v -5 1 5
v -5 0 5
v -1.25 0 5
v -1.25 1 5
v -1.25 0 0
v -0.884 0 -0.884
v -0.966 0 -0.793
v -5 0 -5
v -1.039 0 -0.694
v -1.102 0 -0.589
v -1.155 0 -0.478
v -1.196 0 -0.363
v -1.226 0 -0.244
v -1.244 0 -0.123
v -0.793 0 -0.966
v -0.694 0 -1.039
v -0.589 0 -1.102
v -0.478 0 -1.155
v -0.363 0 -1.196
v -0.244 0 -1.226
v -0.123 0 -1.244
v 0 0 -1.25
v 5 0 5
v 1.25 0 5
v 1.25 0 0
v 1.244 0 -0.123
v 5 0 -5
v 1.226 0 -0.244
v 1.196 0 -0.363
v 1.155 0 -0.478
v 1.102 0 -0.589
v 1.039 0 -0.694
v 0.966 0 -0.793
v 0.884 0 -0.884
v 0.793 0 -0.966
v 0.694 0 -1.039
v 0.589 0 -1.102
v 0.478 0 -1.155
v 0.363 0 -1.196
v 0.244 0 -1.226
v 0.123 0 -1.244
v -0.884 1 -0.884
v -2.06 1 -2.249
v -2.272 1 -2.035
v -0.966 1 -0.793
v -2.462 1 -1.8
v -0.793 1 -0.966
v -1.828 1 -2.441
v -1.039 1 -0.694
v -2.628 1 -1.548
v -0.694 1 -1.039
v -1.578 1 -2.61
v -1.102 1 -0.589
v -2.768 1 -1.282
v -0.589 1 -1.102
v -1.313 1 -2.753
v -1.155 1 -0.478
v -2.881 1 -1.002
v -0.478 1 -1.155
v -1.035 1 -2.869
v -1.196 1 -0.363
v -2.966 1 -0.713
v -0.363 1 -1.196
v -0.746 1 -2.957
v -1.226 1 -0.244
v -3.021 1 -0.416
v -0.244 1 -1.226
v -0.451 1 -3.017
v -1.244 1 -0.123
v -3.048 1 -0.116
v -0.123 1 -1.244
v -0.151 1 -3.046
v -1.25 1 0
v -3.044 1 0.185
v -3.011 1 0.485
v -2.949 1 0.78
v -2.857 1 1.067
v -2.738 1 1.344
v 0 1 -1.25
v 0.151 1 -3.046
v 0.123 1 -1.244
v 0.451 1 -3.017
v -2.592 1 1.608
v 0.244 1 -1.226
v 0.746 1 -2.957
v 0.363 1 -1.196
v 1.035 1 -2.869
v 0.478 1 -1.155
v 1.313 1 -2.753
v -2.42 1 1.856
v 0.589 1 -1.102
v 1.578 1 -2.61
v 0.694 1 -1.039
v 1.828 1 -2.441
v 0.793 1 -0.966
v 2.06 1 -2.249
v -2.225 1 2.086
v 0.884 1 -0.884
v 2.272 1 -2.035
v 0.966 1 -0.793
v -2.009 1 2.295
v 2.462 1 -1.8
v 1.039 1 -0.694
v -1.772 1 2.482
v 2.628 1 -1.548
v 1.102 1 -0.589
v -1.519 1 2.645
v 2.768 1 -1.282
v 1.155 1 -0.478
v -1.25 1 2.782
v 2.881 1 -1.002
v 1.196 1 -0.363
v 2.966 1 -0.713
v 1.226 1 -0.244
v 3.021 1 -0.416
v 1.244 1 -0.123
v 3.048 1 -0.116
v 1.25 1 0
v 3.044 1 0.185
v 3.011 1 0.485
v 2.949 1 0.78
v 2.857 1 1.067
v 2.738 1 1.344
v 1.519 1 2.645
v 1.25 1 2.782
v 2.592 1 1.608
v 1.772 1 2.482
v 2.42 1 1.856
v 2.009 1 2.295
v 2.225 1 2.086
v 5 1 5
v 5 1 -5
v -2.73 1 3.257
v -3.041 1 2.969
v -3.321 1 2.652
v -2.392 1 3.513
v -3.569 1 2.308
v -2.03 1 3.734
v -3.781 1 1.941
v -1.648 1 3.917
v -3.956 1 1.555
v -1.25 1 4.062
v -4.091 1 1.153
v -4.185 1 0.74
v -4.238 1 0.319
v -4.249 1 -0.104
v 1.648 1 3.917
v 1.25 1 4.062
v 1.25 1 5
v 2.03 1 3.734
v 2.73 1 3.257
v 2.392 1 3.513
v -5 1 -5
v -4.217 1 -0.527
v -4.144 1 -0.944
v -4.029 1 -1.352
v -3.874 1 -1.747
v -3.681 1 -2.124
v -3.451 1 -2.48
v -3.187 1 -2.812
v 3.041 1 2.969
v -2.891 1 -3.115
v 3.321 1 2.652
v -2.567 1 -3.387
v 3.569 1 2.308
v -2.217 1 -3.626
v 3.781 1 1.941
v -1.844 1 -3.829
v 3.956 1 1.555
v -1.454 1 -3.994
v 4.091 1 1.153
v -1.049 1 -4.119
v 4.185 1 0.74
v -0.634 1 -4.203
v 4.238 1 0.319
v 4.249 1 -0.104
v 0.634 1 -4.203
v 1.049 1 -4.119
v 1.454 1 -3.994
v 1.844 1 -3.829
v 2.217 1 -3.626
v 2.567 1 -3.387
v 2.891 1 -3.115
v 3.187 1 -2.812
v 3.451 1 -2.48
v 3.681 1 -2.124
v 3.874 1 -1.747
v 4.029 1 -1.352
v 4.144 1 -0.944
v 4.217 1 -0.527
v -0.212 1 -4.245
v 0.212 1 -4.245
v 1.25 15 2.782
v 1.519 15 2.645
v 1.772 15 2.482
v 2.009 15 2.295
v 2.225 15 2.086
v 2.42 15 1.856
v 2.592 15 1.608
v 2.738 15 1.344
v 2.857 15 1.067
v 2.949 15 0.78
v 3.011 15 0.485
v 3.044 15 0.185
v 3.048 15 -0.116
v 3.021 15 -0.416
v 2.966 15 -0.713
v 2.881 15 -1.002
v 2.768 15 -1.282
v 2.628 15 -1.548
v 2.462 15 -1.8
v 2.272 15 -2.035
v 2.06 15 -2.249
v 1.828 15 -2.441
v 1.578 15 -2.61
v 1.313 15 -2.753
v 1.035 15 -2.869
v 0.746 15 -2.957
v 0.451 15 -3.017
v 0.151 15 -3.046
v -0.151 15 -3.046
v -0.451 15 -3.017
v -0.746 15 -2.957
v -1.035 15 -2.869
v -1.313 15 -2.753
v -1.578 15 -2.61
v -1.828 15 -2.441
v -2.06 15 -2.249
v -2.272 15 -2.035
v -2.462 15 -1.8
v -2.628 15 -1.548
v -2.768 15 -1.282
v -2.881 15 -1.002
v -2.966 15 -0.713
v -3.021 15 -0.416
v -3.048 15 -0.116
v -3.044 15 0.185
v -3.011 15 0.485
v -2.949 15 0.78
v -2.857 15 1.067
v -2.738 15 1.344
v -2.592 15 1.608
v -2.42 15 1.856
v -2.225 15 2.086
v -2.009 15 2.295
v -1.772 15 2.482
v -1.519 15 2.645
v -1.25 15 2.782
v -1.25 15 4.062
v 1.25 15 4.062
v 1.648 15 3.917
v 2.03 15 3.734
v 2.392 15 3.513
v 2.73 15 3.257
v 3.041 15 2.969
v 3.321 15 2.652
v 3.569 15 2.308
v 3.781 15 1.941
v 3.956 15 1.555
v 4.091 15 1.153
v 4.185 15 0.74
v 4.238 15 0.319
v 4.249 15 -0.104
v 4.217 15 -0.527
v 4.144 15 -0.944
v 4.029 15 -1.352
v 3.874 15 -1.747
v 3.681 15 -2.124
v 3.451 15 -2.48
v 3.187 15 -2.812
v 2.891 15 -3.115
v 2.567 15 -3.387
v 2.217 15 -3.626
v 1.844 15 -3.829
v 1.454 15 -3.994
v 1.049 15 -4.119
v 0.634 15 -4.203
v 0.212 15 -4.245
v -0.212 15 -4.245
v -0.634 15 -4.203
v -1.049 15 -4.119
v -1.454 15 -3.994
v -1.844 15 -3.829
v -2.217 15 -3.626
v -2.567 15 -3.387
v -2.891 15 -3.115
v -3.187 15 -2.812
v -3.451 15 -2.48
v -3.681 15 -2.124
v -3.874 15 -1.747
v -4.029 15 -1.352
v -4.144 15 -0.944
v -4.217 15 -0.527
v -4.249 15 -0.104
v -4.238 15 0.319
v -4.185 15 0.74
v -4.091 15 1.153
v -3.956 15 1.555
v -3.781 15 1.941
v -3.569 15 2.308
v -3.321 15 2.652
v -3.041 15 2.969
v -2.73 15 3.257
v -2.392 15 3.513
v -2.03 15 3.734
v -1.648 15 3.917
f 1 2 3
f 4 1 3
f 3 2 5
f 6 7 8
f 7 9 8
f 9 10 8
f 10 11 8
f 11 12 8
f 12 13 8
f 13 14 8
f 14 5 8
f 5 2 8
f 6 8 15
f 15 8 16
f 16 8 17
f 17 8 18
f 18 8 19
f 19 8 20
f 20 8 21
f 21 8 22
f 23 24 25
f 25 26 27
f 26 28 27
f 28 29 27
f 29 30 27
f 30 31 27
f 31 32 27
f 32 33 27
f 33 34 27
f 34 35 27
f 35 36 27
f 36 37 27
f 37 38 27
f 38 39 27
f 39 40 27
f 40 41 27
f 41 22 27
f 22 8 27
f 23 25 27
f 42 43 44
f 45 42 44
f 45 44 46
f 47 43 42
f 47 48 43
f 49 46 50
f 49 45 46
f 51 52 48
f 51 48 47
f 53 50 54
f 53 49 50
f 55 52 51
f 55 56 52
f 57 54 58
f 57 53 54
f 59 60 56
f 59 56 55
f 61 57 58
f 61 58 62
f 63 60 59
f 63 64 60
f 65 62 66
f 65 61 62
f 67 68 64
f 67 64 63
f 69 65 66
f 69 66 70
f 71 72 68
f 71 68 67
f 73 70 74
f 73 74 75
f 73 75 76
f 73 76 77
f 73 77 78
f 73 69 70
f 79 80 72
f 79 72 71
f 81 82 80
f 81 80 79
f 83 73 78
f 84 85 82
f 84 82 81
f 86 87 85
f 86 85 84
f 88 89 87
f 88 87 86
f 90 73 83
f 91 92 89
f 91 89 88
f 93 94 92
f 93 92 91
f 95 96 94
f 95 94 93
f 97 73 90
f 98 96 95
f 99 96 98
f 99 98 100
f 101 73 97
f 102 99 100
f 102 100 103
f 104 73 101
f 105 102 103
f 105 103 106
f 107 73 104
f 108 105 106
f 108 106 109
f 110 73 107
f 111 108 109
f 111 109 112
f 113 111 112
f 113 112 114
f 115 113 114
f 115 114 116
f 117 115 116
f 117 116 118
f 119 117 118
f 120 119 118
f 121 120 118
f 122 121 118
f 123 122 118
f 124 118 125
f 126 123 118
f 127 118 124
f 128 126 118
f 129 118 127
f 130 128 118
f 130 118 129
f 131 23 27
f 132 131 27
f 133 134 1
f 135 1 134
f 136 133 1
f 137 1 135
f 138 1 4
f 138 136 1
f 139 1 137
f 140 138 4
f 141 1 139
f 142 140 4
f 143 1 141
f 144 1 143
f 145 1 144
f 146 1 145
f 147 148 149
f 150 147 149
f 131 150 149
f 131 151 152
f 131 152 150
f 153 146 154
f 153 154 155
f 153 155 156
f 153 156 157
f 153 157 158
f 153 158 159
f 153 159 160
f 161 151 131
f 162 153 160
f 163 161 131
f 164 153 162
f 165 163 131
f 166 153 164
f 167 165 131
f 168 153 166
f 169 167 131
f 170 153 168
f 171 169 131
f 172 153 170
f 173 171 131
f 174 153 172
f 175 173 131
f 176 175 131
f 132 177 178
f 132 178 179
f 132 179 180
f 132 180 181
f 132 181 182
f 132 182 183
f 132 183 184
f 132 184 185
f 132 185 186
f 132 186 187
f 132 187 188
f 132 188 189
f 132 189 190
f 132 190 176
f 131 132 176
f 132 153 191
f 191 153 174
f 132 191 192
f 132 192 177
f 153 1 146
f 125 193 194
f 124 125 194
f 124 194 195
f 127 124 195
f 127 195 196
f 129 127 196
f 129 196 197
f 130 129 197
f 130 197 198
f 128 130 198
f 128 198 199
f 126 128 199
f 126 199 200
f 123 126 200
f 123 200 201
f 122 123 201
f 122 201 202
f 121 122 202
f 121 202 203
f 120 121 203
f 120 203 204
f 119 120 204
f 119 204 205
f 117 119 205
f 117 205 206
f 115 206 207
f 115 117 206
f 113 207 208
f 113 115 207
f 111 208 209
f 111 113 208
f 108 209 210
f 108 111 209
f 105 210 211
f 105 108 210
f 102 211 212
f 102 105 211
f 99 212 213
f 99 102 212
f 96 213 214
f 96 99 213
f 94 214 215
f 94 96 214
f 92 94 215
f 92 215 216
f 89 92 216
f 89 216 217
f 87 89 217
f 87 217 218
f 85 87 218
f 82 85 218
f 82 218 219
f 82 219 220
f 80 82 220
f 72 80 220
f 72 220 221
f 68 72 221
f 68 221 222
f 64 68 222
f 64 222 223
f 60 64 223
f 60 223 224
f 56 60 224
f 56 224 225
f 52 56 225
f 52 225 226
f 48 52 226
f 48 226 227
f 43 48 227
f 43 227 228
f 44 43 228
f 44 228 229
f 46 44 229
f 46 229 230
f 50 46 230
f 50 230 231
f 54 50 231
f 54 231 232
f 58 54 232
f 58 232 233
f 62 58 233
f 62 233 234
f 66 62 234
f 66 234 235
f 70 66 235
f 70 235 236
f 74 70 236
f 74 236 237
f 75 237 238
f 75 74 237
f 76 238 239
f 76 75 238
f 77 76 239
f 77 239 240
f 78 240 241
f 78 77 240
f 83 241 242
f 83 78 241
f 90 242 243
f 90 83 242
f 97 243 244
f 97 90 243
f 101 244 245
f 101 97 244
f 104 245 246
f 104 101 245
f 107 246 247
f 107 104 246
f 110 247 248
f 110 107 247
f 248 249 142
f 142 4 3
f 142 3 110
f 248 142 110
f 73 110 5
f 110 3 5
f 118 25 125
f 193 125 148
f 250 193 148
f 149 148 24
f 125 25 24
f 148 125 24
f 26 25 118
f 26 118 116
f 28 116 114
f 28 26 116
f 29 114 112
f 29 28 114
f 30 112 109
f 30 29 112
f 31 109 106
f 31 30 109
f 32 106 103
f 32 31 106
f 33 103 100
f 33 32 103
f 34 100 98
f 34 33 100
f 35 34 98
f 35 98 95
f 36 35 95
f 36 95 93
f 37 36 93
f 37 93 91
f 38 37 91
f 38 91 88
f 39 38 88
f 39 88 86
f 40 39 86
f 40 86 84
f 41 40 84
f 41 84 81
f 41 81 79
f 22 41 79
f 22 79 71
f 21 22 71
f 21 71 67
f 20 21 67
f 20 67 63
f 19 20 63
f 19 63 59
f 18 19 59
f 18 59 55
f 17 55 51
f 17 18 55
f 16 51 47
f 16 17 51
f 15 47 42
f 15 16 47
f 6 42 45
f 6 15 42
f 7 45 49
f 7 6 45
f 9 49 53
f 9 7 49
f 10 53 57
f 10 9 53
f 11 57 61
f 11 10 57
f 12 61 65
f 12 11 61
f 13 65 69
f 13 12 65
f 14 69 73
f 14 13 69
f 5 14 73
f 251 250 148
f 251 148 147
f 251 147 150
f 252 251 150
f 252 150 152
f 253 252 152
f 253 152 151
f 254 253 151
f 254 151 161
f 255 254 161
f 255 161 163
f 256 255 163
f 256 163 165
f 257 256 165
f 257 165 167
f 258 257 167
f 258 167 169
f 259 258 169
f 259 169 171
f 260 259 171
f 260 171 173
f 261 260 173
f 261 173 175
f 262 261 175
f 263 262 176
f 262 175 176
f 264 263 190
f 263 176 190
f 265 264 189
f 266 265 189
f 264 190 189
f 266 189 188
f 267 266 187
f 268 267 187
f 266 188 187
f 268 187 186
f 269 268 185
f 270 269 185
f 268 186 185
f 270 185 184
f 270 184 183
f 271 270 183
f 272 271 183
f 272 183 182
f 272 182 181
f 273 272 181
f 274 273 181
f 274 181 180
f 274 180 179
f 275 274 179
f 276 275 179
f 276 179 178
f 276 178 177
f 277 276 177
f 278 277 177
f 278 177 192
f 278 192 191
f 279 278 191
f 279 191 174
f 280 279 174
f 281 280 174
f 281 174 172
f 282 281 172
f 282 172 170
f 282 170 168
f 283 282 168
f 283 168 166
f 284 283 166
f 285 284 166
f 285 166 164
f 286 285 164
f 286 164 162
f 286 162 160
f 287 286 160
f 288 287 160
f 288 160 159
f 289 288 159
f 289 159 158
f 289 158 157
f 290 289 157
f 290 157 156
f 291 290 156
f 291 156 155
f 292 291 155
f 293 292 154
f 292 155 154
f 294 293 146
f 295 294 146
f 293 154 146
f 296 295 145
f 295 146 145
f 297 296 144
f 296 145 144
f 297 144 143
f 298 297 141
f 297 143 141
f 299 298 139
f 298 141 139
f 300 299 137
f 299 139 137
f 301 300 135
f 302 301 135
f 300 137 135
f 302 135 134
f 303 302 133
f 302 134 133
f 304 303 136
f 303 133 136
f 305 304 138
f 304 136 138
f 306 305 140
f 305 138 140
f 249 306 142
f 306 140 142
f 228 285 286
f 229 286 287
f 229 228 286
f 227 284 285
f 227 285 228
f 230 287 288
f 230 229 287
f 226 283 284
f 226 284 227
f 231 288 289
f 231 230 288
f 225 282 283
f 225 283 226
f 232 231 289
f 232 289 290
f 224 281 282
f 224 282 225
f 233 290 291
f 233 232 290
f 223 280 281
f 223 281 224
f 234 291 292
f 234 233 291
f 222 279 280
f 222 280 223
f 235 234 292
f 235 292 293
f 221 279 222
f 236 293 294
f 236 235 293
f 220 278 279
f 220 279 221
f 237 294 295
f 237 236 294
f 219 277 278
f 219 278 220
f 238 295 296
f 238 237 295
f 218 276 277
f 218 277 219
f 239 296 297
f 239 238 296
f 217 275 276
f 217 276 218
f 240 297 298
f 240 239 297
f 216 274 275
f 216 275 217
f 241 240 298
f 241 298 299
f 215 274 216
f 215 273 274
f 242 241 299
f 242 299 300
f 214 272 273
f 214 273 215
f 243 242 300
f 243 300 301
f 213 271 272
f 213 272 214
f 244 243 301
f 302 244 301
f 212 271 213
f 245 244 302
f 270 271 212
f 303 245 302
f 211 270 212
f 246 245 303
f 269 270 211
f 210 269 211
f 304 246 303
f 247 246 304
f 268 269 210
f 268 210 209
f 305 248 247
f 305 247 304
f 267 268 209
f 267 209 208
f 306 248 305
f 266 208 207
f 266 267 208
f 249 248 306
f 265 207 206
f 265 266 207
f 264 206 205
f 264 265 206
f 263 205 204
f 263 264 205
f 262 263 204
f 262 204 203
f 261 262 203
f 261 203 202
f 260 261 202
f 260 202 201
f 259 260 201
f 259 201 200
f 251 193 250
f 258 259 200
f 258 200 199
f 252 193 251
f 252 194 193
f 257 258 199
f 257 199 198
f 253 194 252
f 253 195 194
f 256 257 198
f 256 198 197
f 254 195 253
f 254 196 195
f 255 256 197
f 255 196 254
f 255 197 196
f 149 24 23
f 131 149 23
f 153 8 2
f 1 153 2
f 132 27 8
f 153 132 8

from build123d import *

# Parameters (mm, degrees)
SKETCH1_R           = 4.25
SKETCH1_R_2         = 3.05
BOSS_EXTRUDE1_DEPTH = 15
SKETCH2_R           = 3.05
SKETCH2_R_2         = 1.25
BOSS_EXTRUDE2_DEPTH = 1
CUT_EXTRUDE1_DEPTH  = 15
BOSS_EXTRUDE3_DEPTH = 1


with BuildPart() as part:
    # Sketch1 → Boss-Extrude1 (new body)
    with BuildSketch(Plane(origin=(0, 0, 0), x_dir=(1, 0, 0), z_dir=(0, 1, 0))):
        with Locations(Location((0, 0, 0), (0, 0, 270))):
            Circle(SKETCH1_R)
        with Locations(Location((0, 0, 0), (0, 0, 270))):
            Circle(SKETCH1_R_2, mode=Mode.SUBTRACT)
    extrude(amount=BOSS_EXTRUDE1_DEPTH)

    # Sketch2 → Boss-Extrude2 (add)
    with BuildSketch(Plane(origin=(0, 0, 0), x_dir=(1, 0, 0), z_dir=(0, 1, 0))):
        with Locations(Location((0, 0, 0), (0, 0, 270))):
            Circle(SKETCH2_R)
        with Locations(Location((0, 0, 0), (0, 0, 270))):
            Circle(SKETCH2_R_2, mode=Mode.SUBTRACT)
    extrude(amount=BOSS_EXTRUDE2_DEPTH)

    # Sketch3 → Cut-Extrude1 (cut)
    with BuildSketch(Plane(origin=(0, 0, 0), x_dir=(1, 0, 0), z_dir=(0, 1, 0))):
        with BuildLine():
            ThreePointArc((1.25, 0), (0, -1.25), (-1.25, 0))
            Line((-1.25, 0), (-1.25, -5.072282681))
            Line((-1.25, -5.072282681), (1.25, -5.072282681))
            Line((1.25, -5.072282681), (1.25, 0))
        make_face()
    extrude(amount=CUT_EXTRUDE1_DEPTH, mode=Mode.SUBTRACT)

    # Sketch4 → Boss-Extrude3 (add)
    with BuildSketch(Plane(origin=(0, 0, 0), x_dir=(1, 0, 0), z_dir=(0, 1, 0))):
        with BuildLine():
            Line((-1.25, -5), (-1.25, 0))
            ThreePointArc((-1.25, 0), (0, 1.25), (1.25, 0))
            Line((1.25, 0), (1.25, -5))
            Line((1.25, -5), (5, -5))
            Line((5, -5), (5, 5))
            Line((5, 5), (-5, 5))
            Line((-5, 5), (-5, -5))
            Line((-5, -5), (-1.25, -5))
        make_face()
    extrude(amount=BOSS_EXTRUDE3_DEPTH)


solid = part.part
